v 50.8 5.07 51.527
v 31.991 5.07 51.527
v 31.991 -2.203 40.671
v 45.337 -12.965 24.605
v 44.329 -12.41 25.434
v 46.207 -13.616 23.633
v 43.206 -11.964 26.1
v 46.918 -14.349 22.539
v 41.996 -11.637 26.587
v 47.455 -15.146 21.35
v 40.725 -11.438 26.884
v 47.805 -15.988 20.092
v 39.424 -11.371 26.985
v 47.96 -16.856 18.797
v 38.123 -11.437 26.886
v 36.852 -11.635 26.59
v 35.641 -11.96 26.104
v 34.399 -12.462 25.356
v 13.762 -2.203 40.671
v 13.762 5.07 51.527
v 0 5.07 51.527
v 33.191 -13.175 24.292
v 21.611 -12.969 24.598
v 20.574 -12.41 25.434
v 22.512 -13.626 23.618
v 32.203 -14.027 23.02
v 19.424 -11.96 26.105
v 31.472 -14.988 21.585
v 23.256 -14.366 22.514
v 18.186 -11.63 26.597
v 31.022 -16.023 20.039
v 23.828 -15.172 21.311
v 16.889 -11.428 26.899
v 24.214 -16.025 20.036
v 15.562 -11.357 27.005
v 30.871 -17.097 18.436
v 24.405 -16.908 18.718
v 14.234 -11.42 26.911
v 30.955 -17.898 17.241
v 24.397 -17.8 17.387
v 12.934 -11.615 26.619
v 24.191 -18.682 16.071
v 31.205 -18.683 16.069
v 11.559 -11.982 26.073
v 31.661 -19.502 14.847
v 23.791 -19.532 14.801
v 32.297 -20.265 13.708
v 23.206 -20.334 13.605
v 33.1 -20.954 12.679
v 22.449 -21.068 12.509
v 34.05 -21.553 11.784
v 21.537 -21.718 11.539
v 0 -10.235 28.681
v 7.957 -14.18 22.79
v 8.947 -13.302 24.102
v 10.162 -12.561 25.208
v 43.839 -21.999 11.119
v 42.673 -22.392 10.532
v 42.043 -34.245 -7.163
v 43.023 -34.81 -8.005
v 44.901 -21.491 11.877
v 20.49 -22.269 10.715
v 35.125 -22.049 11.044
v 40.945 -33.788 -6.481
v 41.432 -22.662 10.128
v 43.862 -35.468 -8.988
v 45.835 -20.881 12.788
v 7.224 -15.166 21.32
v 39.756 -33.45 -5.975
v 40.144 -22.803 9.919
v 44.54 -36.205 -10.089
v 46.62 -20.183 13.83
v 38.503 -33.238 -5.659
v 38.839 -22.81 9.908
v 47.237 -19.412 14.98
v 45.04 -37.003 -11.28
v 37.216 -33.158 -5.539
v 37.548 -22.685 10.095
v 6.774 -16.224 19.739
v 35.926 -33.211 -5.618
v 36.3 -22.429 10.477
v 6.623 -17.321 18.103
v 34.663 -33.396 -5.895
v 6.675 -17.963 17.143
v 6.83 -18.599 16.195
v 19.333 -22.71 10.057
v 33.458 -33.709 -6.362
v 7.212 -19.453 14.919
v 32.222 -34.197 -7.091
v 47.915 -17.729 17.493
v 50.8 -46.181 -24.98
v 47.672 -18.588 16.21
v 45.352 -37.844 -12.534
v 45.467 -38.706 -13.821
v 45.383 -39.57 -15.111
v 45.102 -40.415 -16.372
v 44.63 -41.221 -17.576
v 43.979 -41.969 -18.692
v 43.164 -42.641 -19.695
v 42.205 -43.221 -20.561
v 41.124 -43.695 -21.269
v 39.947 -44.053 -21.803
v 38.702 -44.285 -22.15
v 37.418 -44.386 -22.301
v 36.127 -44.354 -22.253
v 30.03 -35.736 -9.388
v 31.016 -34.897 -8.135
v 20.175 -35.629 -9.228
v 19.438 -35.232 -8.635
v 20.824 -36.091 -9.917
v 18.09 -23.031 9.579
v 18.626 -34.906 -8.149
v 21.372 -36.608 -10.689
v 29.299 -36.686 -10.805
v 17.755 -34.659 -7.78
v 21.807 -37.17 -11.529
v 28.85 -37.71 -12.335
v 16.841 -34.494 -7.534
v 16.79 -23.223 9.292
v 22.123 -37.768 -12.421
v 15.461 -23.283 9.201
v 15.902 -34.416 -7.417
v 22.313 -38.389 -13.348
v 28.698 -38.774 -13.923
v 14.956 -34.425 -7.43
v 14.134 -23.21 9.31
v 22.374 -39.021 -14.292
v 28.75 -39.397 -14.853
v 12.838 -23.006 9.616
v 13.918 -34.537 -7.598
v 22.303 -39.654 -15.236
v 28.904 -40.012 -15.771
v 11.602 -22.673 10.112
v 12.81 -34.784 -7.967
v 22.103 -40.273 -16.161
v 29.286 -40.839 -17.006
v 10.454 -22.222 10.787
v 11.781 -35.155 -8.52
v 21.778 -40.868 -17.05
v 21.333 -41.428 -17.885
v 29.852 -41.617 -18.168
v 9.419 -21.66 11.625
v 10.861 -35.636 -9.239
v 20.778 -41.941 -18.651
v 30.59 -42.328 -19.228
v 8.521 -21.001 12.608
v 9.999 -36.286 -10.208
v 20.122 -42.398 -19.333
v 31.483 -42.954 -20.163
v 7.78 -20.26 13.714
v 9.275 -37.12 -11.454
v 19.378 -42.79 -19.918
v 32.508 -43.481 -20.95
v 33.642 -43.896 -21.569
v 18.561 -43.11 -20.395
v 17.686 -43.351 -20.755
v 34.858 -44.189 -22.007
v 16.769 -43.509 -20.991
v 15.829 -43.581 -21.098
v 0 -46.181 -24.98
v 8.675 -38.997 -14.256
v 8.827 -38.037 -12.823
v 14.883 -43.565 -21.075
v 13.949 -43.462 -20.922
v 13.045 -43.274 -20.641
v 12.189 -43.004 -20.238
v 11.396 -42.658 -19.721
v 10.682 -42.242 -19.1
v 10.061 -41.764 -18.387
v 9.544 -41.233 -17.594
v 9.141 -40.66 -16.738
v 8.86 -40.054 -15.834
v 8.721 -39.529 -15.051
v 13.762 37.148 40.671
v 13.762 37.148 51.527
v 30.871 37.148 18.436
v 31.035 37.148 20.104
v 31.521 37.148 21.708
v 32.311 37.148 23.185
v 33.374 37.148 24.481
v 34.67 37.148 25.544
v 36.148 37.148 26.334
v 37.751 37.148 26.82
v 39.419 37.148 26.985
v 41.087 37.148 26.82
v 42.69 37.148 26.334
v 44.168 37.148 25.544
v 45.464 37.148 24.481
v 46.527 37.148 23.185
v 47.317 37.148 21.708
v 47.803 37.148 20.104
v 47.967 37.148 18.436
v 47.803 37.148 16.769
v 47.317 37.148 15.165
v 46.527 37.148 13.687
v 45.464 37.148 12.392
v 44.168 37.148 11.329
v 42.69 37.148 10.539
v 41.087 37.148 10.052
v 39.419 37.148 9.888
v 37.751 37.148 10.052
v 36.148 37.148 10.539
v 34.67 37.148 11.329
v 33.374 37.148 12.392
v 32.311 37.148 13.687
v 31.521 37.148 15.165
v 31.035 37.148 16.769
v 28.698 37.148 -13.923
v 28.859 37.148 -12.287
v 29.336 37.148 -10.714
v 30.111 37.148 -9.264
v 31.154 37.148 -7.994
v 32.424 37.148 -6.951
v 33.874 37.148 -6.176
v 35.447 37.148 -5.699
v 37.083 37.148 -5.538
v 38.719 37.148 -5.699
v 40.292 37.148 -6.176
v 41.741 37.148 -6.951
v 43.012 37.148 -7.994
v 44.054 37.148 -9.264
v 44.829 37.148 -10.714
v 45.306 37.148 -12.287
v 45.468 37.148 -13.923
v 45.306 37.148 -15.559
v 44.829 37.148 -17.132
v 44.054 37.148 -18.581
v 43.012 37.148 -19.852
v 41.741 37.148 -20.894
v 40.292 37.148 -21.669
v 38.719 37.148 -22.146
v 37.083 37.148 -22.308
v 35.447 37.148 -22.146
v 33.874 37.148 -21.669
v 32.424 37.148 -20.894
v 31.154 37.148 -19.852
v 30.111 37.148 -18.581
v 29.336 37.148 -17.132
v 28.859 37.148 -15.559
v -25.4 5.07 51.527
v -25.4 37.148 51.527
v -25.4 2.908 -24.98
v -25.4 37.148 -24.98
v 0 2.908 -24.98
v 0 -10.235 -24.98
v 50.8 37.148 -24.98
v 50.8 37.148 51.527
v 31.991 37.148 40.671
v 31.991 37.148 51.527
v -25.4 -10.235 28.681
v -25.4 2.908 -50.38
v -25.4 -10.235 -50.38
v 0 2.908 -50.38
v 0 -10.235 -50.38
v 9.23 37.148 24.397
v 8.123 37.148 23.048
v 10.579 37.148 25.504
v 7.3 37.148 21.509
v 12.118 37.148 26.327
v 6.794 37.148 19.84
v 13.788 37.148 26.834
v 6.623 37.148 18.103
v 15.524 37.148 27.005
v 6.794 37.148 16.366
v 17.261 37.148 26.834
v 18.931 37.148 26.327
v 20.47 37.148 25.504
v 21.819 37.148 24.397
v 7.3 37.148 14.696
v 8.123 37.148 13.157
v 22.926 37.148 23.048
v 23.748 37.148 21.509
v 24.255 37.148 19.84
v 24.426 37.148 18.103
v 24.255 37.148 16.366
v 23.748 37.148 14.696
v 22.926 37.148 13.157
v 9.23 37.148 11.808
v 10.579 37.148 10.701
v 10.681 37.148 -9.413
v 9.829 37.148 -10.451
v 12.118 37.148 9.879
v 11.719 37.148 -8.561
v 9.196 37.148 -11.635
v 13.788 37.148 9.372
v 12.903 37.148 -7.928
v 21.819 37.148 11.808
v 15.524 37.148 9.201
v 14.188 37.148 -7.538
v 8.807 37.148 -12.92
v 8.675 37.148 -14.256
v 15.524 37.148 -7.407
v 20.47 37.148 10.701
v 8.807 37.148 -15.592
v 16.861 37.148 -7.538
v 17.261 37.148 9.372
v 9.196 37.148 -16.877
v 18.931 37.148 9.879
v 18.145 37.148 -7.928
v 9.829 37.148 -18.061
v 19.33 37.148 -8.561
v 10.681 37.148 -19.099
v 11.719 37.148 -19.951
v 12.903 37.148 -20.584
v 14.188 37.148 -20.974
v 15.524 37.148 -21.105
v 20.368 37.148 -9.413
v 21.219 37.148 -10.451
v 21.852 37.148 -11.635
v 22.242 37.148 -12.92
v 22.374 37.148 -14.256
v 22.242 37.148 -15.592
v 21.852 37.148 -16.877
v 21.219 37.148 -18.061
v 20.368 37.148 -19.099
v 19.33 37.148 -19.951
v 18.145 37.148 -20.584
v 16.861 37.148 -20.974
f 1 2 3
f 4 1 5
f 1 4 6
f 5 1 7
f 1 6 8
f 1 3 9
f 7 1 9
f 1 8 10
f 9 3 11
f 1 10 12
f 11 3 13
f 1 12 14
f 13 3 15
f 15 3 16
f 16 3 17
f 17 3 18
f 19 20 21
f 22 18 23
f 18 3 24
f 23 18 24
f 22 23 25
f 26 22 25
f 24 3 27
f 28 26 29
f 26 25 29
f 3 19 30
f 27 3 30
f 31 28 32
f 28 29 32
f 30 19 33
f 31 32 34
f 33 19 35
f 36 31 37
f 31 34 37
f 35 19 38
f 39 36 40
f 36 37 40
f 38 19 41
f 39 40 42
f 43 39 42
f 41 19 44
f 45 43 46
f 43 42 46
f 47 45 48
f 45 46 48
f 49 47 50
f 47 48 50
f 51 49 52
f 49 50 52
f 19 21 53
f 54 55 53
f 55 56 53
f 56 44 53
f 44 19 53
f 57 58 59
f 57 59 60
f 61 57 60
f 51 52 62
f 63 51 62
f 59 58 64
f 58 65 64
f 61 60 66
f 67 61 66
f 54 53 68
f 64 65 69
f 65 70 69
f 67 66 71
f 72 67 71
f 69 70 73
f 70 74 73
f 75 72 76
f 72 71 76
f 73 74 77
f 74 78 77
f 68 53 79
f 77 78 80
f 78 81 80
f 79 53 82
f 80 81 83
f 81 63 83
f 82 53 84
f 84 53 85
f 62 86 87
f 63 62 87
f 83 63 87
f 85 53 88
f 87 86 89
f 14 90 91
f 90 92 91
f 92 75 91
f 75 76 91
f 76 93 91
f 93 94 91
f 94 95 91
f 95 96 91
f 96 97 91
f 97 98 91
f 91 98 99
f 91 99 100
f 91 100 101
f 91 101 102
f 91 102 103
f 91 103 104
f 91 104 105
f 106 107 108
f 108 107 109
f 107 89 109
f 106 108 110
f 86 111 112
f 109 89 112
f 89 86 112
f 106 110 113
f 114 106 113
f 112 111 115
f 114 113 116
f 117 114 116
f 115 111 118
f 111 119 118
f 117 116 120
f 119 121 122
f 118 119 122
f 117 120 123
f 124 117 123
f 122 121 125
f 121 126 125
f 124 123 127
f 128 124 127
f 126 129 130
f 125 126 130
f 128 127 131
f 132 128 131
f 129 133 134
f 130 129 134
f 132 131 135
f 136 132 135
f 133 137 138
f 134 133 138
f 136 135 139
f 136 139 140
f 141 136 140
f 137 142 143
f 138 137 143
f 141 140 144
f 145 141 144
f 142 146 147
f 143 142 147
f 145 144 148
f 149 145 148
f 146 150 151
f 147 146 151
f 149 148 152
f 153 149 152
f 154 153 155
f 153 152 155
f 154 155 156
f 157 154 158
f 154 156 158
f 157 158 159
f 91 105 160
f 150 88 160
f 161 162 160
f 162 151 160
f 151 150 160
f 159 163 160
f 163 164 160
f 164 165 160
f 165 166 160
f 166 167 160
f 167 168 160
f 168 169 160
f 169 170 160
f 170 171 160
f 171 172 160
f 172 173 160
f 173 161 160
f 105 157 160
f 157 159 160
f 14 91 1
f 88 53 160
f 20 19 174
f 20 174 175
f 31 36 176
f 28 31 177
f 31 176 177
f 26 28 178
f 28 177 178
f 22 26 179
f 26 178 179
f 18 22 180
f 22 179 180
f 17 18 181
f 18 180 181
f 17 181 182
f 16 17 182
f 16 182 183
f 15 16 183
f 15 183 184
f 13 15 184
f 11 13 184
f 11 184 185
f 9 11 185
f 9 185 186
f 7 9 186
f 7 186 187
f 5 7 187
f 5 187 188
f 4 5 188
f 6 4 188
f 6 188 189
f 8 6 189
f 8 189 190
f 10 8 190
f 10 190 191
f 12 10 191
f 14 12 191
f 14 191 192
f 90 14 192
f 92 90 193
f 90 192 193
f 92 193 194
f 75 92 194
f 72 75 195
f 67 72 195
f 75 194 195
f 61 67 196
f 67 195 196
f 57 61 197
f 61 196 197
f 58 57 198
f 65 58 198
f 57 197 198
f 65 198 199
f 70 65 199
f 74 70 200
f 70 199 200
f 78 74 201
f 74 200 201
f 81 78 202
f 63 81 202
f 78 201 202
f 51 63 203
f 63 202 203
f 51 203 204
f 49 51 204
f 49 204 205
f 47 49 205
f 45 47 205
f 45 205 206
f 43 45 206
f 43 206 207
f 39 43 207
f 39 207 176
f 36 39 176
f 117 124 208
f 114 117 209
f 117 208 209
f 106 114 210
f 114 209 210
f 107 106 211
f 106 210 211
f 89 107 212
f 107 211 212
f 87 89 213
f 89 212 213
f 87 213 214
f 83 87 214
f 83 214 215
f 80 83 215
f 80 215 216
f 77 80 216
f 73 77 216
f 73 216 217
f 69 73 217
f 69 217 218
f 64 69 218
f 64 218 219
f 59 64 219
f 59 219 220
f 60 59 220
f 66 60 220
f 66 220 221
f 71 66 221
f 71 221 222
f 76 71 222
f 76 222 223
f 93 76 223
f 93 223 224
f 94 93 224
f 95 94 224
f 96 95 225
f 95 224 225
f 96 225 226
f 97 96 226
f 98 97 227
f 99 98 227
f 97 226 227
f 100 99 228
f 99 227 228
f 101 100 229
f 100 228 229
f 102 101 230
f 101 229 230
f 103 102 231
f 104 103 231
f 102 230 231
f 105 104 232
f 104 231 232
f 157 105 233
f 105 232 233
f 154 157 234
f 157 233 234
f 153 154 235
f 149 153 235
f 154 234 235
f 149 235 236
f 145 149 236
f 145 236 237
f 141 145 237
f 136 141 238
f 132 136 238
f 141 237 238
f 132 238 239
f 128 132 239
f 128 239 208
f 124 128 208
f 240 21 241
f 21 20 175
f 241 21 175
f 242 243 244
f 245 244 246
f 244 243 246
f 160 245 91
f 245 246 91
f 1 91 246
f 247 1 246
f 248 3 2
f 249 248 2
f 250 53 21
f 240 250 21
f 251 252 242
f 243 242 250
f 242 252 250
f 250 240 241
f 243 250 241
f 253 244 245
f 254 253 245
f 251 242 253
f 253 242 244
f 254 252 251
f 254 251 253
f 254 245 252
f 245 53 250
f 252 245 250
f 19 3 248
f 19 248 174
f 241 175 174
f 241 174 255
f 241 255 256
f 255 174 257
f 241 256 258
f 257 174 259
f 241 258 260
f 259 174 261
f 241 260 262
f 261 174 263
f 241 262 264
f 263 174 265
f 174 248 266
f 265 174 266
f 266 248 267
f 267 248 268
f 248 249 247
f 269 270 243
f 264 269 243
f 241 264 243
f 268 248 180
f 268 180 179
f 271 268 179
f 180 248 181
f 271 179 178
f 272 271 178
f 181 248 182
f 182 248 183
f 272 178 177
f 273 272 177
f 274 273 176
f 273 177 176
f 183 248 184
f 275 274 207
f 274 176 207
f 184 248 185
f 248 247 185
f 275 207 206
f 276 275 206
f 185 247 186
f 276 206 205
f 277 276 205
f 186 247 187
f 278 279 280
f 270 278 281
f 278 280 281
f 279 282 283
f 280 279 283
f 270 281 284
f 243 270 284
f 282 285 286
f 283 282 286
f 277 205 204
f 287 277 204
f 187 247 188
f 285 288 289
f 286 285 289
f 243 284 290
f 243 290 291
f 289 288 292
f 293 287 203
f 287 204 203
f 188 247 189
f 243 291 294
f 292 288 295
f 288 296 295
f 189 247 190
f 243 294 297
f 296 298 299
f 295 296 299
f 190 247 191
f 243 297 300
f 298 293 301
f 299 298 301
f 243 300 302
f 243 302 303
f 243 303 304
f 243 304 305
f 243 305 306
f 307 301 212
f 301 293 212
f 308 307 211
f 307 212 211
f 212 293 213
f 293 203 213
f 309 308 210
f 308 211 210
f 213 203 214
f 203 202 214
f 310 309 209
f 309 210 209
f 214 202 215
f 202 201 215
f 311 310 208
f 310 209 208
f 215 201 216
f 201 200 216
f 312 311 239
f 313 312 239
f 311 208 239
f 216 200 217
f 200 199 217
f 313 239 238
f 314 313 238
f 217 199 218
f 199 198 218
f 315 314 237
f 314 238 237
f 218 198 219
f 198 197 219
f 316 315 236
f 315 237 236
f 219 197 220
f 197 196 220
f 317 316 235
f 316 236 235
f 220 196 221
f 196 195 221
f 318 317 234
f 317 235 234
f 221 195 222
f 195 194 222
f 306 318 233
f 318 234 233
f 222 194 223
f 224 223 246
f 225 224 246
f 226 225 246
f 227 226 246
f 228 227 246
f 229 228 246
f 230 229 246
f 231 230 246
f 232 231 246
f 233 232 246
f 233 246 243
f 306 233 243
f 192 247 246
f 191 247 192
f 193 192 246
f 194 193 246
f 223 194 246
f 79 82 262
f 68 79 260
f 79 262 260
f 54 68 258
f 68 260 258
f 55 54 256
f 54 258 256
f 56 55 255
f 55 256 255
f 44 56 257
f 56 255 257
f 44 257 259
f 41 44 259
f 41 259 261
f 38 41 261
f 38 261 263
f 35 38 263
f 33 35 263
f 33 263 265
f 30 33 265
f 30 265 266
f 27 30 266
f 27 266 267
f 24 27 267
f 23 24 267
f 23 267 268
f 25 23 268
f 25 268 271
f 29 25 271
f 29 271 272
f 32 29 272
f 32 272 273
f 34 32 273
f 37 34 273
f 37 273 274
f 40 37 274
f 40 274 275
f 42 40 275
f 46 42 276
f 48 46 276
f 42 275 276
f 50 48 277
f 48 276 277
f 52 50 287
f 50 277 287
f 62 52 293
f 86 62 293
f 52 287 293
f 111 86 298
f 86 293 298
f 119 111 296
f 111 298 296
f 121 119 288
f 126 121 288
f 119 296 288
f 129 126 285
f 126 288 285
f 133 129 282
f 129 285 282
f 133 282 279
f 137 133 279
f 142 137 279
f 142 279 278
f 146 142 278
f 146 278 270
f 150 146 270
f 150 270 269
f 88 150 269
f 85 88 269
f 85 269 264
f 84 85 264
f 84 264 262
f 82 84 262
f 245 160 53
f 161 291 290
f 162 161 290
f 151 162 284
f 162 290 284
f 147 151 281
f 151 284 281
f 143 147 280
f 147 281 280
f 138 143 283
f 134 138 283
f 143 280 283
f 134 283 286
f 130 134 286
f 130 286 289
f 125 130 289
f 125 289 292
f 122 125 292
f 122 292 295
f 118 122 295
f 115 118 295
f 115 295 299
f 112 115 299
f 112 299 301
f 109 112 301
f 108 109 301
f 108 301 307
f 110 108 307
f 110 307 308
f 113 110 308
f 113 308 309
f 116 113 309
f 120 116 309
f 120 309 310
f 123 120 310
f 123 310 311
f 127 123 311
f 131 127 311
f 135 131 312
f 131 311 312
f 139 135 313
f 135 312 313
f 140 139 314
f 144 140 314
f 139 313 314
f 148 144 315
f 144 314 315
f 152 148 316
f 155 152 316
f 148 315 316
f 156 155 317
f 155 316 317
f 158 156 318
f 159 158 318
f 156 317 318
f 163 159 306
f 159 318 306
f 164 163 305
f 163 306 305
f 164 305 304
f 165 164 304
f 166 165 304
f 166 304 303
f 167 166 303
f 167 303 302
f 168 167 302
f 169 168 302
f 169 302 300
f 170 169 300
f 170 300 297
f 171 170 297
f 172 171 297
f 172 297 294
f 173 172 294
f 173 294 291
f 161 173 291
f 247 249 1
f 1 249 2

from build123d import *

# Parameters (mm, degrees)
F1_DEPTH = 50.8
F2_W     = 18.229121
F2_H     = 10.856584
F3_DEPTH = 63.5
F4_R     = 8.548371
F4_R_2   = 8.901735
F4_R_3   = 6.849237
F4_R_4   = 8.384756
F5_DEPTH = 109.474
F7_DEPTH = 25.4
F9_DEPTH = 25.4


with BuildPart() as f1:
    # F0 (on Right) → F1 (new body)
    with BuildSketch(Plane.YZ):
        Polygon((-46.180889, -24.980081), (37.1475, -24.980081), (37.1475, 51.52718), (5.069758, 51.52718), align=None)
    extrude(amount=F1_DEPTH)

    # F2 (on face) → F3 (cut)
    with BuildSketch(Plane(origin=(0, 37.1475, 0), x_dir=(-1, 0, 0), z_dir=(0, 1, 0))):
        with Locations((-22.876179, 46.098888)):
            Rectangle(F2_W, F2_H)
    extrude(amount=-F3_DEPTH, mode=Mode.SUBTRACT)

    # F4 (on face) → F5 (cut)
    with BuildSketch(Plane(origin=(0, 37.1475, 0), x_dir=(-1, 0, 0), z_dir=(0, 1, 0))):
        with Locations((-39.41891, 18.436231)):
            Circle(F4_R)
        with Locations((-15.524367, 18.102858)):
            Circle(F4_R_2)
        with Locations((-15.524367, -14.255895)):
            Circle(F4_R_3)
        with Locations((-37.082806, -13.922811)):
            Circle(F4_R_4)
    extrude(amount=-F5_DEPTH, mode=Mode.SUBTRACT)

    # F6 (on face) → F7 (join)
    with BuildSketch(Plane(origin=(0, 0, 0), x_dir=(0, -1, 0), z_dir=(-1, 0, 0))):
        Polygon((-5.069758, 51.52718), (-37.1475, 51.52718), (-37.1475, -24.980081), (10.234666, -24.980081), (10.234666, 28.680648), align=None)
    extrude(amount=F7_DEPTH)

    # F8 (on face) → F9 (join)
    with BuildSketch(Plane(origin=(0, 0, -24.980081), x_dir=(1, 0, 0), z_dir=(0, 0, -1))):
        Polygon((-25.4, 10.234666), (-25.4, -2.907777), (0, -2.907777), (0, 10.234666), (-21.744397, 10.234666), align=None)
    extrude(amount=F9_DEPTH)


solid = f1.part
